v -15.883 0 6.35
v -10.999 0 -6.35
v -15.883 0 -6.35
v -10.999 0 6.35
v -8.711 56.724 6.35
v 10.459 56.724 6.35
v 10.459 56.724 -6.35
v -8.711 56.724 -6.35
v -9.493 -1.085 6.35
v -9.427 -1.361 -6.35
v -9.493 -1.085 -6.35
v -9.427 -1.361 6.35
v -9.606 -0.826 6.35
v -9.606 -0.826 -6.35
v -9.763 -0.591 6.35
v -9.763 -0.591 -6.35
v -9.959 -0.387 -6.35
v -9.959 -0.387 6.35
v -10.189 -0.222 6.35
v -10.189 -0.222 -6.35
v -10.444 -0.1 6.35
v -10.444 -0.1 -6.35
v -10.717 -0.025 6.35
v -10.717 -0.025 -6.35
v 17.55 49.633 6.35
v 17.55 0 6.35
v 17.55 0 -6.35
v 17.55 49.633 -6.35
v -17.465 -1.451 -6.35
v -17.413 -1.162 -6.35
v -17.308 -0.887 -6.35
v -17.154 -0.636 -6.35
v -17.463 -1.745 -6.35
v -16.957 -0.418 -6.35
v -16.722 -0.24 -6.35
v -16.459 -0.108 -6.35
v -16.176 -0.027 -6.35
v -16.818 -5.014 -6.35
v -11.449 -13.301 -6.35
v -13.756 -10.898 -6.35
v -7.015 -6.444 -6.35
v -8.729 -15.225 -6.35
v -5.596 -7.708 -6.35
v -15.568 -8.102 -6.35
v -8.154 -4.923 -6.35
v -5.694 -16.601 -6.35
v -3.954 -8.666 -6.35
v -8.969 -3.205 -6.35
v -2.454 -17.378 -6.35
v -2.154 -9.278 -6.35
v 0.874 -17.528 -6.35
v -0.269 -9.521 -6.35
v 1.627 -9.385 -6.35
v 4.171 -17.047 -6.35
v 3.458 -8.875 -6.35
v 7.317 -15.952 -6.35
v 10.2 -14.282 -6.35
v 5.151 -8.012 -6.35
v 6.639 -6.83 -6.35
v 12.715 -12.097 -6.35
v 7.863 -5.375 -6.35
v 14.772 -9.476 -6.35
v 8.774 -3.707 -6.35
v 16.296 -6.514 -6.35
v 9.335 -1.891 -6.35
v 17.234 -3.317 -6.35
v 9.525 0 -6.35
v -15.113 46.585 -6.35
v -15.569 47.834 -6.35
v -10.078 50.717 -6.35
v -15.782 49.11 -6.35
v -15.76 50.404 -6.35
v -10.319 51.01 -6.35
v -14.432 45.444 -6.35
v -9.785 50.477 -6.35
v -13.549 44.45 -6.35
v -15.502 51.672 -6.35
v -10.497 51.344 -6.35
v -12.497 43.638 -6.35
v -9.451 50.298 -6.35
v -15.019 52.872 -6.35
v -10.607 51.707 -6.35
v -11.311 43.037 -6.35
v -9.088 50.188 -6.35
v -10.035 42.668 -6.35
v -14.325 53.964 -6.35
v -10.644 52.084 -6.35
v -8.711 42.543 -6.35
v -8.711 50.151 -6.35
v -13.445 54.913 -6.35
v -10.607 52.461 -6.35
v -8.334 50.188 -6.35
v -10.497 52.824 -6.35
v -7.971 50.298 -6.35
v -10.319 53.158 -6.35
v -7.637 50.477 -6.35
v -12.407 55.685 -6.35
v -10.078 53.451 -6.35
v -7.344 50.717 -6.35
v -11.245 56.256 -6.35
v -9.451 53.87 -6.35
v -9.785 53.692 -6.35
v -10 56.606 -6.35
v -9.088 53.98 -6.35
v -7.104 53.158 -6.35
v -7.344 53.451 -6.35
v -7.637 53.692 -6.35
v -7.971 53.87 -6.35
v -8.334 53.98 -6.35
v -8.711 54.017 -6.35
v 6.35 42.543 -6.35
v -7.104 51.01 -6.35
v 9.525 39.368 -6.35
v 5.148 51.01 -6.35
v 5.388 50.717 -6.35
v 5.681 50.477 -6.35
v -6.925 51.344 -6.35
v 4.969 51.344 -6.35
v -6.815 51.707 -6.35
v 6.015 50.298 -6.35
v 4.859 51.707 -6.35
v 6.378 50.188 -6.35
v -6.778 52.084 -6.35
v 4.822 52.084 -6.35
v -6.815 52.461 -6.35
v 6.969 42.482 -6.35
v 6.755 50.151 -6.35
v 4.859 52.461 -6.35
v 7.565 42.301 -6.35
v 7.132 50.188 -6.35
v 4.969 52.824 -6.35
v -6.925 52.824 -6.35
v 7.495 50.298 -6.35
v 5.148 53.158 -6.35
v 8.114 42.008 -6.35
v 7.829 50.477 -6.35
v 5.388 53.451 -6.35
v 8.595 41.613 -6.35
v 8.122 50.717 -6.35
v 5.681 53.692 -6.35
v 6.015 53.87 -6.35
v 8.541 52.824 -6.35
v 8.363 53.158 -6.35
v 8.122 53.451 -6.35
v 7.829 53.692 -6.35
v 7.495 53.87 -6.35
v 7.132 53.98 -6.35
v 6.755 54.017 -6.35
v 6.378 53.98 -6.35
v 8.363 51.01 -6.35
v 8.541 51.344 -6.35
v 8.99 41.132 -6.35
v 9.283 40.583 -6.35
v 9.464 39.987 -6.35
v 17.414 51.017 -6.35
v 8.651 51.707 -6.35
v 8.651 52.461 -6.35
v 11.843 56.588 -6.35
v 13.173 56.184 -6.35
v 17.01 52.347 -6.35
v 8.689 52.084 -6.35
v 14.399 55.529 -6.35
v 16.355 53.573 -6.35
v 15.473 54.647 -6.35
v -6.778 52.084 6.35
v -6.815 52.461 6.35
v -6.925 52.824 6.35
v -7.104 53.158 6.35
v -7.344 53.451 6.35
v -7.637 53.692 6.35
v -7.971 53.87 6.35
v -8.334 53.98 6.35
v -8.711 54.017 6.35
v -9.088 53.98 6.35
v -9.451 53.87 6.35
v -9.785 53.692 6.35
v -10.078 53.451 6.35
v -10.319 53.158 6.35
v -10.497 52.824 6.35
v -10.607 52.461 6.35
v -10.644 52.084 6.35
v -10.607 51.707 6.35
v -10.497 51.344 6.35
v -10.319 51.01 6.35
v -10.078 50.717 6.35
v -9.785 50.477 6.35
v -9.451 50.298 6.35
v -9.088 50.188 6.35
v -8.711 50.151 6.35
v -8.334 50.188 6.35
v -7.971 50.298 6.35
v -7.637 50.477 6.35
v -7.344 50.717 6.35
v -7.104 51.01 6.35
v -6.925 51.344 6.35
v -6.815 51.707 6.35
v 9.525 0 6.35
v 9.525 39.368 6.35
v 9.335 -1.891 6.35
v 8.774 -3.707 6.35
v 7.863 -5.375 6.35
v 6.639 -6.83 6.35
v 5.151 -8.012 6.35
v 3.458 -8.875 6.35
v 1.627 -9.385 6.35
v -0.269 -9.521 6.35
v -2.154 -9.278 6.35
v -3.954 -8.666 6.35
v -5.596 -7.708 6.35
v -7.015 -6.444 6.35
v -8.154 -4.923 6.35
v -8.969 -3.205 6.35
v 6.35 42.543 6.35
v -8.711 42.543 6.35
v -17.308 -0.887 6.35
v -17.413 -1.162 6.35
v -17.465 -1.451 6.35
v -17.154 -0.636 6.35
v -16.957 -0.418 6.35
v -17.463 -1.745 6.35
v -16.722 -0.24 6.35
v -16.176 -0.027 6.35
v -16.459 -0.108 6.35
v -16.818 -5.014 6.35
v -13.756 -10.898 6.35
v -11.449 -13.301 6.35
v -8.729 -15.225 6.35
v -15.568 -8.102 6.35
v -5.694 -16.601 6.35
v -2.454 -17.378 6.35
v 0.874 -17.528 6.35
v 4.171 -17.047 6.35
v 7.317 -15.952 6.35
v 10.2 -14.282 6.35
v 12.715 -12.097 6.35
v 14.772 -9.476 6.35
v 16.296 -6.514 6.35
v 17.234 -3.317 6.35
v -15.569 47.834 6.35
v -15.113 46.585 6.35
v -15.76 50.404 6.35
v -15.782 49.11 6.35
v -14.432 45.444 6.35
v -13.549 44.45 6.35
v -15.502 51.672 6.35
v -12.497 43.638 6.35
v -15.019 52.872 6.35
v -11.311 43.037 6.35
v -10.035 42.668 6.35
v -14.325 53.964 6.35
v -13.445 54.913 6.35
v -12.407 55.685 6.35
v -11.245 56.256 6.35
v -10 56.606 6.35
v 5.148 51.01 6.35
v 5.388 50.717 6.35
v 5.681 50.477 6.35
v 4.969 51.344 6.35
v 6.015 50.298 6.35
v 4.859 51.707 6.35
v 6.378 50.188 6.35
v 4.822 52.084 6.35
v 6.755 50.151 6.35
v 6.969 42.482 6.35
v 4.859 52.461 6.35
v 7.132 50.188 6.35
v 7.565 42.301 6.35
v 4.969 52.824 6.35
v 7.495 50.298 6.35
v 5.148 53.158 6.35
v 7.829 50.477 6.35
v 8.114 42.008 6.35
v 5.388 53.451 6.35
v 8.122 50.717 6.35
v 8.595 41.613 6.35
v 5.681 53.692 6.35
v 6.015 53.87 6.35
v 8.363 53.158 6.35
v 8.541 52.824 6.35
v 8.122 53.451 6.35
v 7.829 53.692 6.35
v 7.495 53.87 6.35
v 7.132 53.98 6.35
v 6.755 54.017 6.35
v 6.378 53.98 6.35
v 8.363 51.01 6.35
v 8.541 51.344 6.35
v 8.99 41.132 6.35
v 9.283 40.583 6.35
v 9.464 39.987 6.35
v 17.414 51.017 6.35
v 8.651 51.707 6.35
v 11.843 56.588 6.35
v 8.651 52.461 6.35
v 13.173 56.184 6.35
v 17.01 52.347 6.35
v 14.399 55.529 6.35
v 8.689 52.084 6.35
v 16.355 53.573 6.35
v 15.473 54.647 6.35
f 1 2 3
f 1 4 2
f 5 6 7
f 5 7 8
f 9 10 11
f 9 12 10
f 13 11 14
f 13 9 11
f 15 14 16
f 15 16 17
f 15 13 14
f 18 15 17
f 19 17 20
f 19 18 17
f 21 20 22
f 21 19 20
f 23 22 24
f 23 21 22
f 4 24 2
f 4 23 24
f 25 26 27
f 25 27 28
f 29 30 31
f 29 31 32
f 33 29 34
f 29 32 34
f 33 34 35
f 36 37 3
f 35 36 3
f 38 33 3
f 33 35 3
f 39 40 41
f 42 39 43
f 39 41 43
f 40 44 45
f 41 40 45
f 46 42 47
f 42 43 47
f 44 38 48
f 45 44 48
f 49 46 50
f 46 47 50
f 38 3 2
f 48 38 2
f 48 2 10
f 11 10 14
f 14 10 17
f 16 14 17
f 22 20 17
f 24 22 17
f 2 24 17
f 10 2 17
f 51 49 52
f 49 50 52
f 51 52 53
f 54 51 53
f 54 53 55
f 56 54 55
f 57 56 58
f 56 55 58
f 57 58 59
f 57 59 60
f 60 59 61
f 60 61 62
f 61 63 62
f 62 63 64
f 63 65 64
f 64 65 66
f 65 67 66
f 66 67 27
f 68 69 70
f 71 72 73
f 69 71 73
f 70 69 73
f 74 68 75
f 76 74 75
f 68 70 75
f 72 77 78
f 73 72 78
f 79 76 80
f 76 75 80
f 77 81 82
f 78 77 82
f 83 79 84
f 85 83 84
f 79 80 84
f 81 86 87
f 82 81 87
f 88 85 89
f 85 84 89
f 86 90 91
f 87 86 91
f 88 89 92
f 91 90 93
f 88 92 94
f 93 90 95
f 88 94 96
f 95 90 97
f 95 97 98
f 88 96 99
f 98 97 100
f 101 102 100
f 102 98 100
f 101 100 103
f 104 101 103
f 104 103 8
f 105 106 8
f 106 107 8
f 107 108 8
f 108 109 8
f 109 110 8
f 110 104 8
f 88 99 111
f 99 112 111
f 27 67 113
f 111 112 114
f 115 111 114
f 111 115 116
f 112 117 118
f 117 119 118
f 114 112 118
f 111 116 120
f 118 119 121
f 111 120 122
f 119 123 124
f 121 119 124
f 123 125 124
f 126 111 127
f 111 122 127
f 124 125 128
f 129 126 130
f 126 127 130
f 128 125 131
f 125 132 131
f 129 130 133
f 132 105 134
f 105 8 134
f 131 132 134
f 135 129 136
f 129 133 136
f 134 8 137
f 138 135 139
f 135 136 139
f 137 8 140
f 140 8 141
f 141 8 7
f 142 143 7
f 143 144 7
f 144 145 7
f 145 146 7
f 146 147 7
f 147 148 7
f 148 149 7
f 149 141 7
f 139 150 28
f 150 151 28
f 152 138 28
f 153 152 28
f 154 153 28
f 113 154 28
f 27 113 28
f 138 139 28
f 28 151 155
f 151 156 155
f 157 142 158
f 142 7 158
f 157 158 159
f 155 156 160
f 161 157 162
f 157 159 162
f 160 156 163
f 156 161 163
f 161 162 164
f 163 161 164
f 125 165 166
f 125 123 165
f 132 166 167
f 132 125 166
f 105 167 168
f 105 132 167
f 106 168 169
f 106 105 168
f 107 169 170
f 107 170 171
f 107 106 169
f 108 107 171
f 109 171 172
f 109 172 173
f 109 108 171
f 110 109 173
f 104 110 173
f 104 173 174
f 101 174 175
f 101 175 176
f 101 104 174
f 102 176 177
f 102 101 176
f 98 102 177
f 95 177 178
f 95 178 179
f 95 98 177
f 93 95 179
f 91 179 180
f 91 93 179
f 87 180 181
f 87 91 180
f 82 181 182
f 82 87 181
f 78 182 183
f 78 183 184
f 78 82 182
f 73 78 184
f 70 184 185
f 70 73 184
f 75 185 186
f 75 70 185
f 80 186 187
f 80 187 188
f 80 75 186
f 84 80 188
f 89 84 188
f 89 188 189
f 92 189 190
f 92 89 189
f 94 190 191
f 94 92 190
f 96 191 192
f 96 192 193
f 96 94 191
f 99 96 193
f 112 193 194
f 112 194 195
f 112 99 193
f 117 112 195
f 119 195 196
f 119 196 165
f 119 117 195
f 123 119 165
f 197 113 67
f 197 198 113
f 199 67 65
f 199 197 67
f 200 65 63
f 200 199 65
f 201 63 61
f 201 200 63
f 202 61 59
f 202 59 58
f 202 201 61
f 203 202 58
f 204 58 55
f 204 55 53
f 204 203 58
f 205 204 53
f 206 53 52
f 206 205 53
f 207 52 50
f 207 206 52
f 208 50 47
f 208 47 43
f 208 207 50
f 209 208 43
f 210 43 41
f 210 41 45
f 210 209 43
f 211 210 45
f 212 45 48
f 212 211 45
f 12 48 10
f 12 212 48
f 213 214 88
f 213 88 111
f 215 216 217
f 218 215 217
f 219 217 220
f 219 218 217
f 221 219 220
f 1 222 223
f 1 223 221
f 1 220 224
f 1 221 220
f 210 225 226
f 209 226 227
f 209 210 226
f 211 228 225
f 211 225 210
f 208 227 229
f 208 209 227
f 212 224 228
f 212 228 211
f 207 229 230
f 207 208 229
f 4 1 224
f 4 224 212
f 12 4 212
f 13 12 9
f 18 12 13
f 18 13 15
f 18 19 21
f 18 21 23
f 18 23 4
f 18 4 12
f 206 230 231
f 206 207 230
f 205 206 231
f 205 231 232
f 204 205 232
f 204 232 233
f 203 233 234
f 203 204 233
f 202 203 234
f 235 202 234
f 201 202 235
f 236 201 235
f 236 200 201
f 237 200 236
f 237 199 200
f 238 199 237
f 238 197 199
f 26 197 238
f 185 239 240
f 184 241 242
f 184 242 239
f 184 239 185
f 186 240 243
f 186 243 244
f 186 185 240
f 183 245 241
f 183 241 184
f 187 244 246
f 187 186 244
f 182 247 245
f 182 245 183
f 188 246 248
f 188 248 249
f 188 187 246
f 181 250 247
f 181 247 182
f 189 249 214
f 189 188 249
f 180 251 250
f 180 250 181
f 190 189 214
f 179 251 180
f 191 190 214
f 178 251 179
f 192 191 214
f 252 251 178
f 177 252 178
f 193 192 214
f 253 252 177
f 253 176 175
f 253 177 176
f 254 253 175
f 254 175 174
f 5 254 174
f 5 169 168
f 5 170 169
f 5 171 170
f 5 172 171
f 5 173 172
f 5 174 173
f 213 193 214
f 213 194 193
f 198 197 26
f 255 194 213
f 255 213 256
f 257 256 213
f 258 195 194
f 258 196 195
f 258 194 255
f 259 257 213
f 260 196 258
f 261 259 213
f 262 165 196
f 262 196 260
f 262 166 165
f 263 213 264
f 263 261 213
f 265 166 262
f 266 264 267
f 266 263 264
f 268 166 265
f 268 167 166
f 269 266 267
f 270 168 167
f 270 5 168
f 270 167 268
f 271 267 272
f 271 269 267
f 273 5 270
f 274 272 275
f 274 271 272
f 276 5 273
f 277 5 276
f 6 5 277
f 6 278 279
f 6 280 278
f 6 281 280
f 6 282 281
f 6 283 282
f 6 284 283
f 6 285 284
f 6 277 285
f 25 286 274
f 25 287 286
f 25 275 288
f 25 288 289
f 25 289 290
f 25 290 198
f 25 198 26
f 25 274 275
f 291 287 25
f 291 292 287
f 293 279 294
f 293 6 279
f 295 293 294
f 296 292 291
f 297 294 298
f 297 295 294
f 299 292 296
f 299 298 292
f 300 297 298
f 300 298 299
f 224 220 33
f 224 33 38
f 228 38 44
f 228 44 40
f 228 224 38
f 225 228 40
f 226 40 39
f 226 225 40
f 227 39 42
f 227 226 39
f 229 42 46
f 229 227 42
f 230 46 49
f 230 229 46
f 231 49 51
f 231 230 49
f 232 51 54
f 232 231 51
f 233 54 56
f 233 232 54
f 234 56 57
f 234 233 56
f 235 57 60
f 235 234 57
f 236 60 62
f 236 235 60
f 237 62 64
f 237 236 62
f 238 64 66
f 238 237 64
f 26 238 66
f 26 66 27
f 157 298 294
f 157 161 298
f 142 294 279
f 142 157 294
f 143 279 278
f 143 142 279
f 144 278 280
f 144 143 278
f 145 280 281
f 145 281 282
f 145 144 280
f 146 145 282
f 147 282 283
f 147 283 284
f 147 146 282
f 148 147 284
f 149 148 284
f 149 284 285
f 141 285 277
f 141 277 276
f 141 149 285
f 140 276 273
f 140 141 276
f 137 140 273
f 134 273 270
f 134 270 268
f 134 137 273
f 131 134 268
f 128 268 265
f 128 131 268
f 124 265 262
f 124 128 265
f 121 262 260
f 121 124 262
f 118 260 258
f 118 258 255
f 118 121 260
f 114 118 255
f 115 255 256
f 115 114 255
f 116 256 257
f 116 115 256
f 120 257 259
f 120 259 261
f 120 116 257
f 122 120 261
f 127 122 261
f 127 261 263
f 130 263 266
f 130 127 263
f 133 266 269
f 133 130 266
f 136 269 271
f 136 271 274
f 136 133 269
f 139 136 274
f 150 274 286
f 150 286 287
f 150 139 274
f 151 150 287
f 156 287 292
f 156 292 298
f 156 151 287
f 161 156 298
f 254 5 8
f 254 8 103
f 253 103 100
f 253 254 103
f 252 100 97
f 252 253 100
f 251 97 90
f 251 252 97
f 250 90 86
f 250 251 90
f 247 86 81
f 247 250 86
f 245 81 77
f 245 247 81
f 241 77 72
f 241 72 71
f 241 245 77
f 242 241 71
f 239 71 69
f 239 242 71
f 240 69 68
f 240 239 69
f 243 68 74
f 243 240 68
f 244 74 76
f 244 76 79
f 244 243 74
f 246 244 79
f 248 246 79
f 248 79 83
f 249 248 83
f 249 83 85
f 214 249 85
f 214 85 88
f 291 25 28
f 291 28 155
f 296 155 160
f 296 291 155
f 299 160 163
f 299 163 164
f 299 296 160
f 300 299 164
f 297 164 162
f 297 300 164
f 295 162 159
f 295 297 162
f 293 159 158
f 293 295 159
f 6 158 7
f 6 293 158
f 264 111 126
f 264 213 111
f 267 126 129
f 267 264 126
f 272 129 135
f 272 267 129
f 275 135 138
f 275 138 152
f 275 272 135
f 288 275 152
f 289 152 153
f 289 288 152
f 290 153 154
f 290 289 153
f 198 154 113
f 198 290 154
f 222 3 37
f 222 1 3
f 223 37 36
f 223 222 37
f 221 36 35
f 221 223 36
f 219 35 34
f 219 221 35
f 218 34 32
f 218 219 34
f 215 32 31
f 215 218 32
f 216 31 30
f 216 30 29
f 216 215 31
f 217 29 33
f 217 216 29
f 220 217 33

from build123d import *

# Parameters (mm, degrees)
F0_R     = 1.9332973568
F1_DEPTH = 6.35


# Not quite as in the source:
# - a feature names something its author has since deleted; it is built from what else it names


with BuildPart() as f1:
    # F0 (on Top) → F1 (new body, symmetric)
    with BuildSketch(Plane.XY):
        with BuildLine():
            ThreePointArc((-15.8833512398, 0), (-17.0603794097, -0.5222484159), (-17.4629810004, -1.7453799214))
            ThreePointArc((-17.4629810004, -1.7453799214), (0.8737735944, -17.5282222771), (17.5499873644, 0))
            Line((17.5499873644, 0), (17.5499873644, 49.6334969772))
            ThreePointArc((17.5499873644, 49.6334969772), (15.4732281229, 54.6472373039), (10.4594877962, 56.7239965454))
            Line((10.4594877962, 56.7239965454), (-8.711161666, 56.7239965454))
            ThreePointArc((-8.711161666, 56.7239965454), (-14.3252844017, 53.9644102799), (-15.5694312717, 47.8336852809))
            ThreePointArc((-15.5694312717, 47.8336852809), (-13.0420749687, 44.0193742416), (-8.711161666, 42.5429974091))
            Line((-8.711161666, 42.5429974091), (6.35, 42.5429974091))
            ThreePointArc((6.35, 42.5429974091), (8.5950640303, 41.6130614393), (9.525, 39.3679974091))
            Line((9.525, 39.3679974091), (9.525, 0))
            ThreePointArc((9.525, 0), (0.6821084333, -9.5005448836), (-9.4273051098, -1.3607142857))
            ThreePointArc((-9.4273051098, -1.3607142857), (-9.9592599258, -0.3874627982), (-10.9985226281, 0))
            Line((-10.9985226281, 0), (-15.8833512398, 0))
        make_face()
        with Locations((-8.711161666, 52.084082889)):
            Circle(F0_R, mode=Mode.SUBTRACT)
        with Locations((6.7552171887, 52.084082889)):
            Circle(F0_R, mode=Mode.SUBTRACT)
    extrude(amount=F1_DEPTH, both=True)


solid = f1.part
